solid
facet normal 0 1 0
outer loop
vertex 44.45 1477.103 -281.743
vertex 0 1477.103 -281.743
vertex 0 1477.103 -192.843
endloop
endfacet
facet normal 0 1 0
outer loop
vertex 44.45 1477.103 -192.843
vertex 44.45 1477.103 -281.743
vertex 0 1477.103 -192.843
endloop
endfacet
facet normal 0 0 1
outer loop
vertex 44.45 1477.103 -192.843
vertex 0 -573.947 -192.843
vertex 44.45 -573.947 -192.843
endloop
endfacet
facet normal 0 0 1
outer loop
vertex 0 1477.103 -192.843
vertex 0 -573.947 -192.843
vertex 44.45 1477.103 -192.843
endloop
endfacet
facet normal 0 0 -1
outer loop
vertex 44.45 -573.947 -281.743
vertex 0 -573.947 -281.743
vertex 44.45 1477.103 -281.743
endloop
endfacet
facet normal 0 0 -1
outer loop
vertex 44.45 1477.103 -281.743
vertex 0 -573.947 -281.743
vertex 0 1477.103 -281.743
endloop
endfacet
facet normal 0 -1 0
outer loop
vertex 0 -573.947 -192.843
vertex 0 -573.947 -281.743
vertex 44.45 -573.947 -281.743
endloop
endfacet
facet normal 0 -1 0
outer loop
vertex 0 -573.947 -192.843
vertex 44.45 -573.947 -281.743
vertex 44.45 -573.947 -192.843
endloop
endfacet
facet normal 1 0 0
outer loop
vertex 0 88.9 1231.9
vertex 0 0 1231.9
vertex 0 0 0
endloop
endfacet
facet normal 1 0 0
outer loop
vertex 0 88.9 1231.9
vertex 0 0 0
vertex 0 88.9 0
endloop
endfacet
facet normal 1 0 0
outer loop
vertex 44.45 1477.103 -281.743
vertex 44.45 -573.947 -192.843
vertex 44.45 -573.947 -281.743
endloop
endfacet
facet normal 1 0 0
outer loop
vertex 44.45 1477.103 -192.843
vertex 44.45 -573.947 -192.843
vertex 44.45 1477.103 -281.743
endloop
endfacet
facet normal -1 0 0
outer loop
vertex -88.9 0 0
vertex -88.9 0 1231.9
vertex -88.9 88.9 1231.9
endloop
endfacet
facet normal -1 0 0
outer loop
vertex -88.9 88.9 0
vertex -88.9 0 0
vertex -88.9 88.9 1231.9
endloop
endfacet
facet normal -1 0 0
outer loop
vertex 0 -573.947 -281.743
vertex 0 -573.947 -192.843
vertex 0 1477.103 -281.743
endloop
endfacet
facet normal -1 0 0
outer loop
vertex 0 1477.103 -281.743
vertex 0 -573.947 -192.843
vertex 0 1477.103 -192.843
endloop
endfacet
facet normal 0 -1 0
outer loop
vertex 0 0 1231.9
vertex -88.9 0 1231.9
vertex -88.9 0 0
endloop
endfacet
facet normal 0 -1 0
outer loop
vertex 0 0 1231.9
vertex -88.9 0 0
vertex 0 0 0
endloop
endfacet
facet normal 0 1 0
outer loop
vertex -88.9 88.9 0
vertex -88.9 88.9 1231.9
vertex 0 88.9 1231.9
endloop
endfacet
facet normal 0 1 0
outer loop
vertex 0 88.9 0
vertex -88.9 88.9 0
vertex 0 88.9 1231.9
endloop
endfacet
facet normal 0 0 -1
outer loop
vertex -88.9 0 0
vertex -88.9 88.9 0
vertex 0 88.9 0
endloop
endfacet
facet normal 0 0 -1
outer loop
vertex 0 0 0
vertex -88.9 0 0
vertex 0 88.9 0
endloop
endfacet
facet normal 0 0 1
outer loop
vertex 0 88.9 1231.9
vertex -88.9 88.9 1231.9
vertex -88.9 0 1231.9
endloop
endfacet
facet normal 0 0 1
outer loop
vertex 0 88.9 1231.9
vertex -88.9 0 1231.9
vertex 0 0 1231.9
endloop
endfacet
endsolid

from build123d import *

# Parameters (mm, degrees)
F0_W     = 88.9
F0_H     = 88.9
F1_DEPTH = 1231.9
F2_W     = 2051.05
F2_H     = 88.9
F3_DEPTH = 44.45


with BuildPart() as f1:
    # F0 (on Top) → F1 (new body)
    with BuildSketch(Plane.XY):
        with Locations((-44.45, 44.45)):
            Rectangle(F0_W, F0_H)
    extrude(amount=F1_DEPTH)


with BuildPart() as f3:
    # F2 (on Right) → F3 (new body)
    with BuildSketch(Plane.YZ):
        with Locations((451.577589, -237.292629)):
            Rectangle(F2_W, F2_H)
    extrude(amount=F3_DEPTH)


solid = Compound([f1.part, f3.part])
